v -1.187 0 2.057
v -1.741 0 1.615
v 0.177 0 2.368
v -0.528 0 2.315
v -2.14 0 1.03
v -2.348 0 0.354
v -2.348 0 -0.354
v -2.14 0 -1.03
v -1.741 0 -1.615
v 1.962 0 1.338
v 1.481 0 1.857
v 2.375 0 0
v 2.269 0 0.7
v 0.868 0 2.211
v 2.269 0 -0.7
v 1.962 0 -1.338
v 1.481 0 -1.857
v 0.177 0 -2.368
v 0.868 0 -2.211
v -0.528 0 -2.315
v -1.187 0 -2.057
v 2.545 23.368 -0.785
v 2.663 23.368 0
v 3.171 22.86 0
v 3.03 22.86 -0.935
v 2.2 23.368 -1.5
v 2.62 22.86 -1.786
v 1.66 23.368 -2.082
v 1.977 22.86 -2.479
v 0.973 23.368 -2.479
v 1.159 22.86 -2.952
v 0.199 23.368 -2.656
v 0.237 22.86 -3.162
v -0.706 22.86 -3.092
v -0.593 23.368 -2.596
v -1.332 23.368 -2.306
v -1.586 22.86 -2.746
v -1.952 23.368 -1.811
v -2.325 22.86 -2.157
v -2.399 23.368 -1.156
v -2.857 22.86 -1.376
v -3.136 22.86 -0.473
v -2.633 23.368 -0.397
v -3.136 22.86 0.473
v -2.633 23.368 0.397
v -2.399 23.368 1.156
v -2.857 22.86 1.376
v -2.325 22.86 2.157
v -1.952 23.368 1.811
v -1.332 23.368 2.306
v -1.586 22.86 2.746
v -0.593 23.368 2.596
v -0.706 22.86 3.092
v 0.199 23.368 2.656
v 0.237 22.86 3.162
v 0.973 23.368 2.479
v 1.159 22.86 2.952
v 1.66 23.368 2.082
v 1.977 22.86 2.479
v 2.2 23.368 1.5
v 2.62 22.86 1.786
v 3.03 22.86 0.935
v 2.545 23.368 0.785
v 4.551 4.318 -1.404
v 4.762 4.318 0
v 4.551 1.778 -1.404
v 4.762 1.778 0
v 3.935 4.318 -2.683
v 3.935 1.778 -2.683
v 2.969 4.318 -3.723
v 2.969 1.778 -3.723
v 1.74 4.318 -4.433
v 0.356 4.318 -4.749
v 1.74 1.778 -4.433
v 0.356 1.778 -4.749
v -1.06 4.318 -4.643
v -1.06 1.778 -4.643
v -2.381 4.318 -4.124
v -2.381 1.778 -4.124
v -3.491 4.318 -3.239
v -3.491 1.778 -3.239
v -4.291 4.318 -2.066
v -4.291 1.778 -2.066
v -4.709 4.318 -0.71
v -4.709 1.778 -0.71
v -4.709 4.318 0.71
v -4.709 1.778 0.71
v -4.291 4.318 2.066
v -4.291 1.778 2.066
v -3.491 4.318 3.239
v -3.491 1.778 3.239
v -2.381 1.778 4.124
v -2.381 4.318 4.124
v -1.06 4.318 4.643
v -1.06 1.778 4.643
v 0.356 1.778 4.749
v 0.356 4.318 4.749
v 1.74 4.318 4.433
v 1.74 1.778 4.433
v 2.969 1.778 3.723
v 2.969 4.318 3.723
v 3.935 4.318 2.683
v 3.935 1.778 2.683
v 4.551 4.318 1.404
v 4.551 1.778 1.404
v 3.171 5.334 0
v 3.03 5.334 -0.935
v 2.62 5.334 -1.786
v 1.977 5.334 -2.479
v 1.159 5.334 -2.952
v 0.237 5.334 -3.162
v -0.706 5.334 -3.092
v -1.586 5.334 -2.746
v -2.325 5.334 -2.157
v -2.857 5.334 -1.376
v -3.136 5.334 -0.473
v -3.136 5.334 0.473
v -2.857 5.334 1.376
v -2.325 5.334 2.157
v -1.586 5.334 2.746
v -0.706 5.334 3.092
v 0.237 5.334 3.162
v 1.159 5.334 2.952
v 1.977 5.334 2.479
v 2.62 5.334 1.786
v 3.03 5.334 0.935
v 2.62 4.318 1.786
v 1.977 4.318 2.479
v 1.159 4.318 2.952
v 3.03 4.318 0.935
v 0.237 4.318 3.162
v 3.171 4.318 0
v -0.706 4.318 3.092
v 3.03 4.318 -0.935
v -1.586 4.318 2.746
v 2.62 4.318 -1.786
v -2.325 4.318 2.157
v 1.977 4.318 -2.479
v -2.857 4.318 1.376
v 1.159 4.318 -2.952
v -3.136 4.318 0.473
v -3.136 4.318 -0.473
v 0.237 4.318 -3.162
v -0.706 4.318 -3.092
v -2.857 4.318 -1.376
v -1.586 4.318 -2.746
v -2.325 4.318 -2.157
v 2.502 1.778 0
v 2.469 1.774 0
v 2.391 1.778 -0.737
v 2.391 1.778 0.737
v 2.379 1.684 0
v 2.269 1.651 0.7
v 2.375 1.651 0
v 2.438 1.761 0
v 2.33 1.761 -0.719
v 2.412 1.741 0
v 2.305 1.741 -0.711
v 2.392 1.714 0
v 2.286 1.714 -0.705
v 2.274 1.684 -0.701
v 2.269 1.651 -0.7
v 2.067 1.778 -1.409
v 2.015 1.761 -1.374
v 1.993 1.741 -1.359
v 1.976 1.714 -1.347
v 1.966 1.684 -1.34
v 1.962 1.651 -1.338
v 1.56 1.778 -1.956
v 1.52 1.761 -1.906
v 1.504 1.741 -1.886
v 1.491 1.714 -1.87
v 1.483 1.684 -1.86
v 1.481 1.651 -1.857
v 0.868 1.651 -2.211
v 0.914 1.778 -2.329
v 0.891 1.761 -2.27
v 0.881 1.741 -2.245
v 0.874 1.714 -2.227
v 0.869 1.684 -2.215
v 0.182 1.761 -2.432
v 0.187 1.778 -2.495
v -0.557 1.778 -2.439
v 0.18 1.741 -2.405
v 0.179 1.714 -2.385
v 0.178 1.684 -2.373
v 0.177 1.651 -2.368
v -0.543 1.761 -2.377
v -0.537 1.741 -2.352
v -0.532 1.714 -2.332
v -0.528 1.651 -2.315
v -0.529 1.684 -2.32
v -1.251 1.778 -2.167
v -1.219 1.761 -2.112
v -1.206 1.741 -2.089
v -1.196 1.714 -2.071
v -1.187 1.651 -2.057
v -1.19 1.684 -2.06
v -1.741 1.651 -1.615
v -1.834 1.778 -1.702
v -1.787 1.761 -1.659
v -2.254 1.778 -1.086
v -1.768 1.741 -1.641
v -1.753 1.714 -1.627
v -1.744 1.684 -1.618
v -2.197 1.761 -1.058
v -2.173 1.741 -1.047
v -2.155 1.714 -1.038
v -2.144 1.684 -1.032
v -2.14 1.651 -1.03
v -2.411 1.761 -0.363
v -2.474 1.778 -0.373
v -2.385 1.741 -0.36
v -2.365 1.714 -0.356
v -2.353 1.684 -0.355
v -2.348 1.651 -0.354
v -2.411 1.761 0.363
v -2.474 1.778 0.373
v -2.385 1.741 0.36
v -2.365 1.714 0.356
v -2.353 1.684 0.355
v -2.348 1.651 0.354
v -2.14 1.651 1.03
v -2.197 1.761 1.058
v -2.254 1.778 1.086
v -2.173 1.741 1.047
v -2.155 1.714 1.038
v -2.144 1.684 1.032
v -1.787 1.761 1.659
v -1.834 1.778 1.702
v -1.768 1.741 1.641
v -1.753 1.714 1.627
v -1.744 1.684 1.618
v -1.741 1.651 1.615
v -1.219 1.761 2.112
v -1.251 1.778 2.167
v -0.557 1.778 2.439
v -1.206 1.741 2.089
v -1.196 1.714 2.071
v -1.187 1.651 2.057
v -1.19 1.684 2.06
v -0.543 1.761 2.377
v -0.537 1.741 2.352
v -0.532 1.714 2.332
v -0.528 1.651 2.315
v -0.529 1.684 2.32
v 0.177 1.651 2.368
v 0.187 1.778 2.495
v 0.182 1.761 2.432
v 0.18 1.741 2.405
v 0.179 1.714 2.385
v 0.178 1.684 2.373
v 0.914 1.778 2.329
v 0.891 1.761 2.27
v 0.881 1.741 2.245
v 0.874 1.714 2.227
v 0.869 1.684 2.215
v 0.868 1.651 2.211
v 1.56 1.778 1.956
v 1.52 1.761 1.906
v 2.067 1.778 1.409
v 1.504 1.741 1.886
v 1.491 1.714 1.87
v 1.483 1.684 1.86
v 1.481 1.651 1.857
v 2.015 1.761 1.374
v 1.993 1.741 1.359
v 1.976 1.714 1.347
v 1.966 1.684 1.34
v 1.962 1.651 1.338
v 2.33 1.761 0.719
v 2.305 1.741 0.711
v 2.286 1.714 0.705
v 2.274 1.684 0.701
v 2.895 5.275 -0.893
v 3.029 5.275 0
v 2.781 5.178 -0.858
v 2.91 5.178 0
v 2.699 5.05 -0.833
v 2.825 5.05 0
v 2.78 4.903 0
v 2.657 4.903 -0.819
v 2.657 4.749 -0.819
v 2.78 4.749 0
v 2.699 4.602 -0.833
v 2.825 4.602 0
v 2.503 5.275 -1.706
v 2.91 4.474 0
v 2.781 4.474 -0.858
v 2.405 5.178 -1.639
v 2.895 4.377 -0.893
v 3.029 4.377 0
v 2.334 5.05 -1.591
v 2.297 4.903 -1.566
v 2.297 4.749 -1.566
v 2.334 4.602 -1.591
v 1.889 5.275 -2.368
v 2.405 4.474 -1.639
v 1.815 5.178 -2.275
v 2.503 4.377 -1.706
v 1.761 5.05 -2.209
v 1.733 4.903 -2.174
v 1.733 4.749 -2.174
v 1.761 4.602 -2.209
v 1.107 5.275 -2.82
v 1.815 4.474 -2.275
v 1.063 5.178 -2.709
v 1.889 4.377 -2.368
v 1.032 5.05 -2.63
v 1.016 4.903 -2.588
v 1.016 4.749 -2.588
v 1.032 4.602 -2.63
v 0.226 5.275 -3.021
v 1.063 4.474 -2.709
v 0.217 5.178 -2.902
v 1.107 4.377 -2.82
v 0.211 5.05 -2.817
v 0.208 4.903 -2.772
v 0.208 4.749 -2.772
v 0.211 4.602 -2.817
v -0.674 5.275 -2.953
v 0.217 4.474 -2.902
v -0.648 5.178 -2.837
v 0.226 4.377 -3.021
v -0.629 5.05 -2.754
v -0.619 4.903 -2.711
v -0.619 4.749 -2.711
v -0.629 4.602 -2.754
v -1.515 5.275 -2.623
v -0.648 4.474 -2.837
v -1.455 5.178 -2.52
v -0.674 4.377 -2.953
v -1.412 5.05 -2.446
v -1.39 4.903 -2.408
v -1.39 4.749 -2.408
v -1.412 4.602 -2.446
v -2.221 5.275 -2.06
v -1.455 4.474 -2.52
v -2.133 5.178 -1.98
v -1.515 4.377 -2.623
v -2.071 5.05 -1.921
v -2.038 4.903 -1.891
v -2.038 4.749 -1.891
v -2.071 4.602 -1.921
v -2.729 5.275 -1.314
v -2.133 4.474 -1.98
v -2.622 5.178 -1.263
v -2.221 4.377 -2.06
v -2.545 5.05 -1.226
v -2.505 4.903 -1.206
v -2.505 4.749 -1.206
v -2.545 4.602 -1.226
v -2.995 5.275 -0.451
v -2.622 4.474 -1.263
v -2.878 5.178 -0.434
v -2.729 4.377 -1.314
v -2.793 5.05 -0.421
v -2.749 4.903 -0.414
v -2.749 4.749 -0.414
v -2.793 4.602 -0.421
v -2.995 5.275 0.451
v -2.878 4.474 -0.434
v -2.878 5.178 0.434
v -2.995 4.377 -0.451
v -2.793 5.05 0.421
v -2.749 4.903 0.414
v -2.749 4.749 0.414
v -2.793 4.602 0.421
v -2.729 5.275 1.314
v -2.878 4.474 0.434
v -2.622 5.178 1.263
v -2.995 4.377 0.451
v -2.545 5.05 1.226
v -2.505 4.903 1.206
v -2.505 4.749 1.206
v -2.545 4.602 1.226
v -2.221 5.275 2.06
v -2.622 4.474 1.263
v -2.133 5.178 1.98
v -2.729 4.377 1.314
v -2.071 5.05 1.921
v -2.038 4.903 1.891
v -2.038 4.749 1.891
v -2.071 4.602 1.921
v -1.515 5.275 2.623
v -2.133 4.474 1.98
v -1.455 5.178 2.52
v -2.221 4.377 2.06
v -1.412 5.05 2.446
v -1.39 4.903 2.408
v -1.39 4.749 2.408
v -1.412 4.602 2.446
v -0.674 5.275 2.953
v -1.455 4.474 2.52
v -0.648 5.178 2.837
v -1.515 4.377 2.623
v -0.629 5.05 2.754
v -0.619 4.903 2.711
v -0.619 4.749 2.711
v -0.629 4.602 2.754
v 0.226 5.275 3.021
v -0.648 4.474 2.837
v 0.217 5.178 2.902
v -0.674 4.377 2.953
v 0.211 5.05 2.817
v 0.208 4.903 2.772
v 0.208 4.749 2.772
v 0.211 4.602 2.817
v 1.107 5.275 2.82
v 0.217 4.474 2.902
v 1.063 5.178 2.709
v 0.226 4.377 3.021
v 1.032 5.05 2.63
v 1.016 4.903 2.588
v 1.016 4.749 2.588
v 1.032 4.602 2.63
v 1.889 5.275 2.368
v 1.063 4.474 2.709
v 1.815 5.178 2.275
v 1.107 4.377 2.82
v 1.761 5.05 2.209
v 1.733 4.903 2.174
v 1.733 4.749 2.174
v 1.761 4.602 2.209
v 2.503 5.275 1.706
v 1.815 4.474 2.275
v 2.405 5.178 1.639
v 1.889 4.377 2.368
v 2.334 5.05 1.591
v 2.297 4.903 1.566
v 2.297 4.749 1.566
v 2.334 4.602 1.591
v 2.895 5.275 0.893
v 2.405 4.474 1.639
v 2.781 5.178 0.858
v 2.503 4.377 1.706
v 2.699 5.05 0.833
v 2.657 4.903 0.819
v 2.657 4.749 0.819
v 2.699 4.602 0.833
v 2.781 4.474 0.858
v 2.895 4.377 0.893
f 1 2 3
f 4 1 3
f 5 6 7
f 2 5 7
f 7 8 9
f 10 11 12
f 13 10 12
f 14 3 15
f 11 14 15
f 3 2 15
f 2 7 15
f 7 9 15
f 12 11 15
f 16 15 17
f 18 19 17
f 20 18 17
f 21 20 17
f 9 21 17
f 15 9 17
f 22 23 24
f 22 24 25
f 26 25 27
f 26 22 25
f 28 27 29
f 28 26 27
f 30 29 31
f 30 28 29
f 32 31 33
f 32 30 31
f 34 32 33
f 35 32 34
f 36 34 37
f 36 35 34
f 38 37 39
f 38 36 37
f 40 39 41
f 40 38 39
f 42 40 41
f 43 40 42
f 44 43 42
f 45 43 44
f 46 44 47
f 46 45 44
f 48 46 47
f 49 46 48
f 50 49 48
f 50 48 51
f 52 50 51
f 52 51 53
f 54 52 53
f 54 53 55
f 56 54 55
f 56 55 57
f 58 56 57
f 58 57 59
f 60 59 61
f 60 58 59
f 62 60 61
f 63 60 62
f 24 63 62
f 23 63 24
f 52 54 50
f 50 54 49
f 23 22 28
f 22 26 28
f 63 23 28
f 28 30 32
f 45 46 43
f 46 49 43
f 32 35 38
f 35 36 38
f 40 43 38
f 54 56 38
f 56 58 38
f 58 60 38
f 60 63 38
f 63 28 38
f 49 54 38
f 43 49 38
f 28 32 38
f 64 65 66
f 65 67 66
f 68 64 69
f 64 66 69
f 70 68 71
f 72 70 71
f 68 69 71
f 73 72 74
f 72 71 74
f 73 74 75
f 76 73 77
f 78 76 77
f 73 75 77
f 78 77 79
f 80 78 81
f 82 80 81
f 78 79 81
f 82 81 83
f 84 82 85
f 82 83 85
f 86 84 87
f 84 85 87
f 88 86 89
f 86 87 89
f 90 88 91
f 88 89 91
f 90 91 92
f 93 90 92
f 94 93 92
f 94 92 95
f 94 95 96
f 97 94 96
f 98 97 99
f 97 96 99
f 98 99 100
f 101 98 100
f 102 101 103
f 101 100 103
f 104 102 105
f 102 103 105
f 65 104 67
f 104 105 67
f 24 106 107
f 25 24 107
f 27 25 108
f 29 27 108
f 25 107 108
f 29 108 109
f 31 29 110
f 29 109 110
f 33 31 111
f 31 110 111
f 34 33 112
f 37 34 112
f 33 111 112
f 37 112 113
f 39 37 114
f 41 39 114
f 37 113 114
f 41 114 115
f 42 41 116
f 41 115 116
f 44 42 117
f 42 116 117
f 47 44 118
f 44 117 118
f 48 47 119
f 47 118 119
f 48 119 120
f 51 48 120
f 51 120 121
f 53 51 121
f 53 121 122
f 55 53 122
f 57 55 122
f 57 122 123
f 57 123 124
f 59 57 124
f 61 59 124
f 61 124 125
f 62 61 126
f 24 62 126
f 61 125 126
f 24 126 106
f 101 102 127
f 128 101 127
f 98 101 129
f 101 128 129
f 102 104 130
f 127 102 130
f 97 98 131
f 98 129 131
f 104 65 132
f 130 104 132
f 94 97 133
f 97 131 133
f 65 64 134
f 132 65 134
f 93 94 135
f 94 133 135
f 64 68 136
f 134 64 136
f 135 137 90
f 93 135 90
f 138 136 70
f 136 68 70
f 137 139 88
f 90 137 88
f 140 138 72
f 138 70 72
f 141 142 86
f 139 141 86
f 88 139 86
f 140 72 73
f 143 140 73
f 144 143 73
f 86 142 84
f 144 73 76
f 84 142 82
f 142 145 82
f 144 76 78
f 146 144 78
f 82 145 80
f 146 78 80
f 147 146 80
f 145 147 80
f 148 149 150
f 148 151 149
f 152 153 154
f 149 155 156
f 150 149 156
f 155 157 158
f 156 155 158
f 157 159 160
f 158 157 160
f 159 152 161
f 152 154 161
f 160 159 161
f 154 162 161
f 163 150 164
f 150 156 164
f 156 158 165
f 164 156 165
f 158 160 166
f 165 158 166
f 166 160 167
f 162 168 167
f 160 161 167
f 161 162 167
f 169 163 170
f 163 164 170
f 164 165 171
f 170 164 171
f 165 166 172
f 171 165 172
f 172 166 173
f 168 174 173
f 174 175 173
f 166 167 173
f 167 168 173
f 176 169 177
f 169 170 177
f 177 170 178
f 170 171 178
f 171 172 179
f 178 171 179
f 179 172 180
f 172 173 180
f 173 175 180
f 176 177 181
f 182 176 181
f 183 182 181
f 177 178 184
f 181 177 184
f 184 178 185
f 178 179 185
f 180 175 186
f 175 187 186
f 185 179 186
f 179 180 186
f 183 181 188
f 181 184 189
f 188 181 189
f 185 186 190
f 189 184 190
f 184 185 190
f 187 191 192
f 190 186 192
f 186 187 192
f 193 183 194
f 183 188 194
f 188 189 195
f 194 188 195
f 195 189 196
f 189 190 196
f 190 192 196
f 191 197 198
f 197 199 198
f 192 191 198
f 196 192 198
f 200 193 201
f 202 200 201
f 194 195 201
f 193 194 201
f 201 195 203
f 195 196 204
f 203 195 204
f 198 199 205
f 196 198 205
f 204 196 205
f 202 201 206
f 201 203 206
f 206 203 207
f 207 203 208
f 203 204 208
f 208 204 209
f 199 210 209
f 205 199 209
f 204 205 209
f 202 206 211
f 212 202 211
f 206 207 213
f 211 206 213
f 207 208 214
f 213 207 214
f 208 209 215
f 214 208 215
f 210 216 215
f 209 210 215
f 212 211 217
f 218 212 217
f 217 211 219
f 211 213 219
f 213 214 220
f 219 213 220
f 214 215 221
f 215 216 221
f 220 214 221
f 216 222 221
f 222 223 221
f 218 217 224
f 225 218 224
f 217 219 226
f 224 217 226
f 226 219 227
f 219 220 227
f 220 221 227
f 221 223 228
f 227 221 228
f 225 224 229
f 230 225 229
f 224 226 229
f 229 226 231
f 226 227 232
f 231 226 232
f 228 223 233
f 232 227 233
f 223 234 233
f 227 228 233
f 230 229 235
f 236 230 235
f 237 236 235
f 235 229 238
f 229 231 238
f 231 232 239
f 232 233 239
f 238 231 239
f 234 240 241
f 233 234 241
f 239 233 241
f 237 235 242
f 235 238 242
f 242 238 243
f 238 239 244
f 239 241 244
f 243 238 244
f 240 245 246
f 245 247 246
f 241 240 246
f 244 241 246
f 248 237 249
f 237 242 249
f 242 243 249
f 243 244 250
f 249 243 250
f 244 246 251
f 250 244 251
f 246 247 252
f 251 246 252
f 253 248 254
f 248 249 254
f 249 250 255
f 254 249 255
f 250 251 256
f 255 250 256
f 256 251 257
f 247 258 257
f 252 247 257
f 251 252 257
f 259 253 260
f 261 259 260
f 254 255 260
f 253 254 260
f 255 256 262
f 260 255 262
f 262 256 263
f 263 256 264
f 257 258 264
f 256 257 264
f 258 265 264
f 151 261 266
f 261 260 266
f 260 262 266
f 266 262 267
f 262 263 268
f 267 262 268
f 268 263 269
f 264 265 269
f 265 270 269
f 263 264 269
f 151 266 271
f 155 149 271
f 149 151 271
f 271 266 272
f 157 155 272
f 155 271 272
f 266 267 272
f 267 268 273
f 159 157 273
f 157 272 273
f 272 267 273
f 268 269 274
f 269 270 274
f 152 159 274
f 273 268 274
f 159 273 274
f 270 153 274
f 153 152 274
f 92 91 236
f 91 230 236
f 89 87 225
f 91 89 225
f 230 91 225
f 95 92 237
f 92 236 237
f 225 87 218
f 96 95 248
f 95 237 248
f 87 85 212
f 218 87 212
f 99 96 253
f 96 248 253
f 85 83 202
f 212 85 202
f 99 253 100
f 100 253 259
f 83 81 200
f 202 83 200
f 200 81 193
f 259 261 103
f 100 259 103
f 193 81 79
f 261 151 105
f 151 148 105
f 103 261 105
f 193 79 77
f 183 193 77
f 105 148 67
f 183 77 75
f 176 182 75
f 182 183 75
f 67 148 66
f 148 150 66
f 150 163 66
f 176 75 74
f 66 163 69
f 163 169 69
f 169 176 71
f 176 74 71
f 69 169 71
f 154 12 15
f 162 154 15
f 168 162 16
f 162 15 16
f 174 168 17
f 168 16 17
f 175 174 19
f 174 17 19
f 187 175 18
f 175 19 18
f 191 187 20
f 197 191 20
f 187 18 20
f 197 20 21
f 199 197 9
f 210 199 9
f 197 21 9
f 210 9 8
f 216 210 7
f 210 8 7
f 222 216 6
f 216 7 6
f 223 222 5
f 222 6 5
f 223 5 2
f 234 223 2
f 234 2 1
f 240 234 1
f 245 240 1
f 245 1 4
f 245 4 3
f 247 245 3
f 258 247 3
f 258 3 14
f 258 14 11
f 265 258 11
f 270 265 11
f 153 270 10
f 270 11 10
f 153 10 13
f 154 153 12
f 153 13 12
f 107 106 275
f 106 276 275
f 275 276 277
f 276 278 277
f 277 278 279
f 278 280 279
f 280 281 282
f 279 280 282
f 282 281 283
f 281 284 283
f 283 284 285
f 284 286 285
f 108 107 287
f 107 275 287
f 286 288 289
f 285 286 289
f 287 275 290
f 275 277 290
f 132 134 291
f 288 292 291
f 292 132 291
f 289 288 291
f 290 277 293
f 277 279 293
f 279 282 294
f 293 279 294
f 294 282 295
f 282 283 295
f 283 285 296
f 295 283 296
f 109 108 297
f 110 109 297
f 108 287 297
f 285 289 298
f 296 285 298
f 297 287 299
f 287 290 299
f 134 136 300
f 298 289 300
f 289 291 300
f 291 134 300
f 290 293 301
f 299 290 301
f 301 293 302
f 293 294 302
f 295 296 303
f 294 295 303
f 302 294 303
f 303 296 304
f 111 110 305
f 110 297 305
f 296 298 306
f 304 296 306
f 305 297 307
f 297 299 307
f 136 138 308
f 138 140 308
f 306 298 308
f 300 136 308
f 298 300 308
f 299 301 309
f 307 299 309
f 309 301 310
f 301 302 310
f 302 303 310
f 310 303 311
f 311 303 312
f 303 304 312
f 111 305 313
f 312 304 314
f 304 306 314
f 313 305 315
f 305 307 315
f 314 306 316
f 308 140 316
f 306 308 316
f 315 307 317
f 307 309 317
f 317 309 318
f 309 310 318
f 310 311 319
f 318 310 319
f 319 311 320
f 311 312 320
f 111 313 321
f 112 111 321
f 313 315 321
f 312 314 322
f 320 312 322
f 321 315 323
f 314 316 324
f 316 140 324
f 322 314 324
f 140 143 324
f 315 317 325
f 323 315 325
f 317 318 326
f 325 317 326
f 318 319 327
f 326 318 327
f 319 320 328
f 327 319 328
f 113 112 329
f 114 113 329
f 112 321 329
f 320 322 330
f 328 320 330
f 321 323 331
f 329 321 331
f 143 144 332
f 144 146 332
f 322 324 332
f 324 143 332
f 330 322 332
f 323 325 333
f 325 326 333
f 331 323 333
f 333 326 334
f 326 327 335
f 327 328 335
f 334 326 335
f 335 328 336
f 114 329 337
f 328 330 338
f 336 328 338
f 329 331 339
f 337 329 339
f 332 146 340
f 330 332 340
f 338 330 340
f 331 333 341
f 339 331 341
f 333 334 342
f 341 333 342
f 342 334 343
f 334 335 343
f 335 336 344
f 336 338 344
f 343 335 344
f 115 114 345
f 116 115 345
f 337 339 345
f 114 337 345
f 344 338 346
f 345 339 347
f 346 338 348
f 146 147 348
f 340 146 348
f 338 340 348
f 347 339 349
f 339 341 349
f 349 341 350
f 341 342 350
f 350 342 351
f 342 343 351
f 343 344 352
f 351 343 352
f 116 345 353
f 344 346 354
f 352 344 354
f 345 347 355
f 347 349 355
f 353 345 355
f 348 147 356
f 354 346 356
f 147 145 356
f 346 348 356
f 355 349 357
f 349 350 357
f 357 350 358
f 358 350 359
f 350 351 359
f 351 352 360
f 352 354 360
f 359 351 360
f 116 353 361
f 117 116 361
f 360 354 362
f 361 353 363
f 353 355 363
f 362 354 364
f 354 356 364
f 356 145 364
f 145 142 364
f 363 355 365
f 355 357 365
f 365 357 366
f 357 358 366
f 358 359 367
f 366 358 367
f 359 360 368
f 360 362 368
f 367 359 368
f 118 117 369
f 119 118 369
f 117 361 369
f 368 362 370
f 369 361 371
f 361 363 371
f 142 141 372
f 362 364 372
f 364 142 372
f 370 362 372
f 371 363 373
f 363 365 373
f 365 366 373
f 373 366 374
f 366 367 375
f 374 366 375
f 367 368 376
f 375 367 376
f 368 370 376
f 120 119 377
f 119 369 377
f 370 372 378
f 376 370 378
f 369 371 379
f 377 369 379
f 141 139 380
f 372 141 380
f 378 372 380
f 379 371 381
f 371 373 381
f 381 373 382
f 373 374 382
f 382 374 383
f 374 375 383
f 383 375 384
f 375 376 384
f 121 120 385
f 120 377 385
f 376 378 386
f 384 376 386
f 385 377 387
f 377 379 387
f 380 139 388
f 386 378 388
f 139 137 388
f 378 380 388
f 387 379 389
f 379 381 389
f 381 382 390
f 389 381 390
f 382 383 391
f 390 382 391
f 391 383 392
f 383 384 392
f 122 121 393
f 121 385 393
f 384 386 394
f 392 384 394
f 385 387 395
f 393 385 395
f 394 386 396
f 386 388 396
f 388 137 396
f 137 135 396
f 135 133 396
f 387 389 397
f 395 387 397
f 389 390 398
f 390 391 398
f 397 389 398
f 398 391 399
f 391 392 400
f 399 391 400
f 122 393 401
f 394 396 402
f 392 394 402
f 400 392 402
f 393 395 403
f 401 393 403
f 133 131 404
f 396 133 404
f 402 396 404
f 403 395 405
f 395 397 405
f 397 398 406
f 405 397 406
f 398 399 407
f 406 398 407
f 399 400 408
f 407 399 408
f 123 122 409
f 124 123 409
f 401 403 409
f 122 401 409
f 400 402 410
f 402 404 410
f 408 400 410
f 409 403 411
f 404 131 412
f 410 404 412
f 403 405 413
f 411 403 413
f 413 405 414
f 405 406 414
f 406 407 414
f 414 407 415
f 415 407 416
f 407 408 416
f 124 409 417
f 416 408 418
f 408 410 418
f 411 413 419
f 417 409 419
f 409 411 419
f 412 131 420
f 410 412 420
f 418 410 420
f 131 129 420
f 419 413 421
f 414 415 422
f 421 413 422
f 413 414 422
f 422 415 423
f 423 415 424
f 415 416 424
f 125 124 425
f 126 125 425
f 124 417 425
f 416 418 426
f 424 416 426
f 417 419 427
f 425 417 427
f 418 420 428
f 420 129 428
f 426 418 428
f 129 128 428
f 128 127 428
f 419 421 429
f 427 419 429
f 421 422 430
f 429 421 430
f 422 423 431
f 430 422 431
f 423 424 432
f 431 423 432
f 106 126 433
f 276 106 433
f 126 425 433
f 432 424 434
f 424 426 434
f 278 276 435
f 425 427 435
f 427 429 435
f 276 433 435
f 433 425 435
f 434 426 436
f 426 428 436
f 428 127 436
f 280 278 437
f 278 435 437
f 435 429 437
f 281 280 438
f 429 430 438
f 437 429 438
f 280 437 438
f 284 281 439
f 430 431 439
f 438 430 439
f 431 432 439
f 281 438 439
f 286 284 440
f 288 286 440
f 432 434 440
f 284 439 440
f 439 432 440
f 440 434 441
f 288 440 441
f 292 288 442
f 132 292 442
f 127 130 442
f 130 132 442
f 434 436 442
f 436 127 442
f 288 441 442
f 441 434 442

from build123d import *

# Parameters (mm, degrees)
FILLET1_R     = 0.127
CHAMFER1_SIZE = 0.508


with BuildPart() as part:
    # Sketch1 → Revolve1 (revolve)
    with BuildSketch(Plane.XY):
        with BuildLine():
            Line((0, 23.368), (3.17119, 23.368))
            Line((3.17119, 23.368), (3.17119, 5.334))
            ThreePointArc((3.17119, 5.334), (2.774555586, 4.826), (3.17119, 4.318))
            Line((3.17119, 4.318), (4.7625, 4.318))
            Line((4.7625, 4.318), (4.7625, 1.778))
            Line((4.7625, 1.778), (2.3749, 1.778))
            Line((2.3749, 1.778), (2.3749, 0))
            Line((2.3749, 0), (0, 0))
            Line((0, 0), (0, 23.368))
        make_face()
    revolve(axis=Axis((0, 0, 0), (0, 1, 0)))

    # Fillet1
    fillet1_edges = [part.edges().sort_by_distance(p)[0] for p in [
        (-2.3749, 1.778, 0),
    ]]
    fillet(fillet1_edges, radius=FILLET1_R)

    # Chamfer1
    chamfer1_edges = [part.edges().sort_by_distance(p)[0] for p in [
        (-3.17119, 23.368, 0),
    ]]
    chamfer(chamfer1_edges, length=CHAMFER1_SIZE)


solid = part.part
